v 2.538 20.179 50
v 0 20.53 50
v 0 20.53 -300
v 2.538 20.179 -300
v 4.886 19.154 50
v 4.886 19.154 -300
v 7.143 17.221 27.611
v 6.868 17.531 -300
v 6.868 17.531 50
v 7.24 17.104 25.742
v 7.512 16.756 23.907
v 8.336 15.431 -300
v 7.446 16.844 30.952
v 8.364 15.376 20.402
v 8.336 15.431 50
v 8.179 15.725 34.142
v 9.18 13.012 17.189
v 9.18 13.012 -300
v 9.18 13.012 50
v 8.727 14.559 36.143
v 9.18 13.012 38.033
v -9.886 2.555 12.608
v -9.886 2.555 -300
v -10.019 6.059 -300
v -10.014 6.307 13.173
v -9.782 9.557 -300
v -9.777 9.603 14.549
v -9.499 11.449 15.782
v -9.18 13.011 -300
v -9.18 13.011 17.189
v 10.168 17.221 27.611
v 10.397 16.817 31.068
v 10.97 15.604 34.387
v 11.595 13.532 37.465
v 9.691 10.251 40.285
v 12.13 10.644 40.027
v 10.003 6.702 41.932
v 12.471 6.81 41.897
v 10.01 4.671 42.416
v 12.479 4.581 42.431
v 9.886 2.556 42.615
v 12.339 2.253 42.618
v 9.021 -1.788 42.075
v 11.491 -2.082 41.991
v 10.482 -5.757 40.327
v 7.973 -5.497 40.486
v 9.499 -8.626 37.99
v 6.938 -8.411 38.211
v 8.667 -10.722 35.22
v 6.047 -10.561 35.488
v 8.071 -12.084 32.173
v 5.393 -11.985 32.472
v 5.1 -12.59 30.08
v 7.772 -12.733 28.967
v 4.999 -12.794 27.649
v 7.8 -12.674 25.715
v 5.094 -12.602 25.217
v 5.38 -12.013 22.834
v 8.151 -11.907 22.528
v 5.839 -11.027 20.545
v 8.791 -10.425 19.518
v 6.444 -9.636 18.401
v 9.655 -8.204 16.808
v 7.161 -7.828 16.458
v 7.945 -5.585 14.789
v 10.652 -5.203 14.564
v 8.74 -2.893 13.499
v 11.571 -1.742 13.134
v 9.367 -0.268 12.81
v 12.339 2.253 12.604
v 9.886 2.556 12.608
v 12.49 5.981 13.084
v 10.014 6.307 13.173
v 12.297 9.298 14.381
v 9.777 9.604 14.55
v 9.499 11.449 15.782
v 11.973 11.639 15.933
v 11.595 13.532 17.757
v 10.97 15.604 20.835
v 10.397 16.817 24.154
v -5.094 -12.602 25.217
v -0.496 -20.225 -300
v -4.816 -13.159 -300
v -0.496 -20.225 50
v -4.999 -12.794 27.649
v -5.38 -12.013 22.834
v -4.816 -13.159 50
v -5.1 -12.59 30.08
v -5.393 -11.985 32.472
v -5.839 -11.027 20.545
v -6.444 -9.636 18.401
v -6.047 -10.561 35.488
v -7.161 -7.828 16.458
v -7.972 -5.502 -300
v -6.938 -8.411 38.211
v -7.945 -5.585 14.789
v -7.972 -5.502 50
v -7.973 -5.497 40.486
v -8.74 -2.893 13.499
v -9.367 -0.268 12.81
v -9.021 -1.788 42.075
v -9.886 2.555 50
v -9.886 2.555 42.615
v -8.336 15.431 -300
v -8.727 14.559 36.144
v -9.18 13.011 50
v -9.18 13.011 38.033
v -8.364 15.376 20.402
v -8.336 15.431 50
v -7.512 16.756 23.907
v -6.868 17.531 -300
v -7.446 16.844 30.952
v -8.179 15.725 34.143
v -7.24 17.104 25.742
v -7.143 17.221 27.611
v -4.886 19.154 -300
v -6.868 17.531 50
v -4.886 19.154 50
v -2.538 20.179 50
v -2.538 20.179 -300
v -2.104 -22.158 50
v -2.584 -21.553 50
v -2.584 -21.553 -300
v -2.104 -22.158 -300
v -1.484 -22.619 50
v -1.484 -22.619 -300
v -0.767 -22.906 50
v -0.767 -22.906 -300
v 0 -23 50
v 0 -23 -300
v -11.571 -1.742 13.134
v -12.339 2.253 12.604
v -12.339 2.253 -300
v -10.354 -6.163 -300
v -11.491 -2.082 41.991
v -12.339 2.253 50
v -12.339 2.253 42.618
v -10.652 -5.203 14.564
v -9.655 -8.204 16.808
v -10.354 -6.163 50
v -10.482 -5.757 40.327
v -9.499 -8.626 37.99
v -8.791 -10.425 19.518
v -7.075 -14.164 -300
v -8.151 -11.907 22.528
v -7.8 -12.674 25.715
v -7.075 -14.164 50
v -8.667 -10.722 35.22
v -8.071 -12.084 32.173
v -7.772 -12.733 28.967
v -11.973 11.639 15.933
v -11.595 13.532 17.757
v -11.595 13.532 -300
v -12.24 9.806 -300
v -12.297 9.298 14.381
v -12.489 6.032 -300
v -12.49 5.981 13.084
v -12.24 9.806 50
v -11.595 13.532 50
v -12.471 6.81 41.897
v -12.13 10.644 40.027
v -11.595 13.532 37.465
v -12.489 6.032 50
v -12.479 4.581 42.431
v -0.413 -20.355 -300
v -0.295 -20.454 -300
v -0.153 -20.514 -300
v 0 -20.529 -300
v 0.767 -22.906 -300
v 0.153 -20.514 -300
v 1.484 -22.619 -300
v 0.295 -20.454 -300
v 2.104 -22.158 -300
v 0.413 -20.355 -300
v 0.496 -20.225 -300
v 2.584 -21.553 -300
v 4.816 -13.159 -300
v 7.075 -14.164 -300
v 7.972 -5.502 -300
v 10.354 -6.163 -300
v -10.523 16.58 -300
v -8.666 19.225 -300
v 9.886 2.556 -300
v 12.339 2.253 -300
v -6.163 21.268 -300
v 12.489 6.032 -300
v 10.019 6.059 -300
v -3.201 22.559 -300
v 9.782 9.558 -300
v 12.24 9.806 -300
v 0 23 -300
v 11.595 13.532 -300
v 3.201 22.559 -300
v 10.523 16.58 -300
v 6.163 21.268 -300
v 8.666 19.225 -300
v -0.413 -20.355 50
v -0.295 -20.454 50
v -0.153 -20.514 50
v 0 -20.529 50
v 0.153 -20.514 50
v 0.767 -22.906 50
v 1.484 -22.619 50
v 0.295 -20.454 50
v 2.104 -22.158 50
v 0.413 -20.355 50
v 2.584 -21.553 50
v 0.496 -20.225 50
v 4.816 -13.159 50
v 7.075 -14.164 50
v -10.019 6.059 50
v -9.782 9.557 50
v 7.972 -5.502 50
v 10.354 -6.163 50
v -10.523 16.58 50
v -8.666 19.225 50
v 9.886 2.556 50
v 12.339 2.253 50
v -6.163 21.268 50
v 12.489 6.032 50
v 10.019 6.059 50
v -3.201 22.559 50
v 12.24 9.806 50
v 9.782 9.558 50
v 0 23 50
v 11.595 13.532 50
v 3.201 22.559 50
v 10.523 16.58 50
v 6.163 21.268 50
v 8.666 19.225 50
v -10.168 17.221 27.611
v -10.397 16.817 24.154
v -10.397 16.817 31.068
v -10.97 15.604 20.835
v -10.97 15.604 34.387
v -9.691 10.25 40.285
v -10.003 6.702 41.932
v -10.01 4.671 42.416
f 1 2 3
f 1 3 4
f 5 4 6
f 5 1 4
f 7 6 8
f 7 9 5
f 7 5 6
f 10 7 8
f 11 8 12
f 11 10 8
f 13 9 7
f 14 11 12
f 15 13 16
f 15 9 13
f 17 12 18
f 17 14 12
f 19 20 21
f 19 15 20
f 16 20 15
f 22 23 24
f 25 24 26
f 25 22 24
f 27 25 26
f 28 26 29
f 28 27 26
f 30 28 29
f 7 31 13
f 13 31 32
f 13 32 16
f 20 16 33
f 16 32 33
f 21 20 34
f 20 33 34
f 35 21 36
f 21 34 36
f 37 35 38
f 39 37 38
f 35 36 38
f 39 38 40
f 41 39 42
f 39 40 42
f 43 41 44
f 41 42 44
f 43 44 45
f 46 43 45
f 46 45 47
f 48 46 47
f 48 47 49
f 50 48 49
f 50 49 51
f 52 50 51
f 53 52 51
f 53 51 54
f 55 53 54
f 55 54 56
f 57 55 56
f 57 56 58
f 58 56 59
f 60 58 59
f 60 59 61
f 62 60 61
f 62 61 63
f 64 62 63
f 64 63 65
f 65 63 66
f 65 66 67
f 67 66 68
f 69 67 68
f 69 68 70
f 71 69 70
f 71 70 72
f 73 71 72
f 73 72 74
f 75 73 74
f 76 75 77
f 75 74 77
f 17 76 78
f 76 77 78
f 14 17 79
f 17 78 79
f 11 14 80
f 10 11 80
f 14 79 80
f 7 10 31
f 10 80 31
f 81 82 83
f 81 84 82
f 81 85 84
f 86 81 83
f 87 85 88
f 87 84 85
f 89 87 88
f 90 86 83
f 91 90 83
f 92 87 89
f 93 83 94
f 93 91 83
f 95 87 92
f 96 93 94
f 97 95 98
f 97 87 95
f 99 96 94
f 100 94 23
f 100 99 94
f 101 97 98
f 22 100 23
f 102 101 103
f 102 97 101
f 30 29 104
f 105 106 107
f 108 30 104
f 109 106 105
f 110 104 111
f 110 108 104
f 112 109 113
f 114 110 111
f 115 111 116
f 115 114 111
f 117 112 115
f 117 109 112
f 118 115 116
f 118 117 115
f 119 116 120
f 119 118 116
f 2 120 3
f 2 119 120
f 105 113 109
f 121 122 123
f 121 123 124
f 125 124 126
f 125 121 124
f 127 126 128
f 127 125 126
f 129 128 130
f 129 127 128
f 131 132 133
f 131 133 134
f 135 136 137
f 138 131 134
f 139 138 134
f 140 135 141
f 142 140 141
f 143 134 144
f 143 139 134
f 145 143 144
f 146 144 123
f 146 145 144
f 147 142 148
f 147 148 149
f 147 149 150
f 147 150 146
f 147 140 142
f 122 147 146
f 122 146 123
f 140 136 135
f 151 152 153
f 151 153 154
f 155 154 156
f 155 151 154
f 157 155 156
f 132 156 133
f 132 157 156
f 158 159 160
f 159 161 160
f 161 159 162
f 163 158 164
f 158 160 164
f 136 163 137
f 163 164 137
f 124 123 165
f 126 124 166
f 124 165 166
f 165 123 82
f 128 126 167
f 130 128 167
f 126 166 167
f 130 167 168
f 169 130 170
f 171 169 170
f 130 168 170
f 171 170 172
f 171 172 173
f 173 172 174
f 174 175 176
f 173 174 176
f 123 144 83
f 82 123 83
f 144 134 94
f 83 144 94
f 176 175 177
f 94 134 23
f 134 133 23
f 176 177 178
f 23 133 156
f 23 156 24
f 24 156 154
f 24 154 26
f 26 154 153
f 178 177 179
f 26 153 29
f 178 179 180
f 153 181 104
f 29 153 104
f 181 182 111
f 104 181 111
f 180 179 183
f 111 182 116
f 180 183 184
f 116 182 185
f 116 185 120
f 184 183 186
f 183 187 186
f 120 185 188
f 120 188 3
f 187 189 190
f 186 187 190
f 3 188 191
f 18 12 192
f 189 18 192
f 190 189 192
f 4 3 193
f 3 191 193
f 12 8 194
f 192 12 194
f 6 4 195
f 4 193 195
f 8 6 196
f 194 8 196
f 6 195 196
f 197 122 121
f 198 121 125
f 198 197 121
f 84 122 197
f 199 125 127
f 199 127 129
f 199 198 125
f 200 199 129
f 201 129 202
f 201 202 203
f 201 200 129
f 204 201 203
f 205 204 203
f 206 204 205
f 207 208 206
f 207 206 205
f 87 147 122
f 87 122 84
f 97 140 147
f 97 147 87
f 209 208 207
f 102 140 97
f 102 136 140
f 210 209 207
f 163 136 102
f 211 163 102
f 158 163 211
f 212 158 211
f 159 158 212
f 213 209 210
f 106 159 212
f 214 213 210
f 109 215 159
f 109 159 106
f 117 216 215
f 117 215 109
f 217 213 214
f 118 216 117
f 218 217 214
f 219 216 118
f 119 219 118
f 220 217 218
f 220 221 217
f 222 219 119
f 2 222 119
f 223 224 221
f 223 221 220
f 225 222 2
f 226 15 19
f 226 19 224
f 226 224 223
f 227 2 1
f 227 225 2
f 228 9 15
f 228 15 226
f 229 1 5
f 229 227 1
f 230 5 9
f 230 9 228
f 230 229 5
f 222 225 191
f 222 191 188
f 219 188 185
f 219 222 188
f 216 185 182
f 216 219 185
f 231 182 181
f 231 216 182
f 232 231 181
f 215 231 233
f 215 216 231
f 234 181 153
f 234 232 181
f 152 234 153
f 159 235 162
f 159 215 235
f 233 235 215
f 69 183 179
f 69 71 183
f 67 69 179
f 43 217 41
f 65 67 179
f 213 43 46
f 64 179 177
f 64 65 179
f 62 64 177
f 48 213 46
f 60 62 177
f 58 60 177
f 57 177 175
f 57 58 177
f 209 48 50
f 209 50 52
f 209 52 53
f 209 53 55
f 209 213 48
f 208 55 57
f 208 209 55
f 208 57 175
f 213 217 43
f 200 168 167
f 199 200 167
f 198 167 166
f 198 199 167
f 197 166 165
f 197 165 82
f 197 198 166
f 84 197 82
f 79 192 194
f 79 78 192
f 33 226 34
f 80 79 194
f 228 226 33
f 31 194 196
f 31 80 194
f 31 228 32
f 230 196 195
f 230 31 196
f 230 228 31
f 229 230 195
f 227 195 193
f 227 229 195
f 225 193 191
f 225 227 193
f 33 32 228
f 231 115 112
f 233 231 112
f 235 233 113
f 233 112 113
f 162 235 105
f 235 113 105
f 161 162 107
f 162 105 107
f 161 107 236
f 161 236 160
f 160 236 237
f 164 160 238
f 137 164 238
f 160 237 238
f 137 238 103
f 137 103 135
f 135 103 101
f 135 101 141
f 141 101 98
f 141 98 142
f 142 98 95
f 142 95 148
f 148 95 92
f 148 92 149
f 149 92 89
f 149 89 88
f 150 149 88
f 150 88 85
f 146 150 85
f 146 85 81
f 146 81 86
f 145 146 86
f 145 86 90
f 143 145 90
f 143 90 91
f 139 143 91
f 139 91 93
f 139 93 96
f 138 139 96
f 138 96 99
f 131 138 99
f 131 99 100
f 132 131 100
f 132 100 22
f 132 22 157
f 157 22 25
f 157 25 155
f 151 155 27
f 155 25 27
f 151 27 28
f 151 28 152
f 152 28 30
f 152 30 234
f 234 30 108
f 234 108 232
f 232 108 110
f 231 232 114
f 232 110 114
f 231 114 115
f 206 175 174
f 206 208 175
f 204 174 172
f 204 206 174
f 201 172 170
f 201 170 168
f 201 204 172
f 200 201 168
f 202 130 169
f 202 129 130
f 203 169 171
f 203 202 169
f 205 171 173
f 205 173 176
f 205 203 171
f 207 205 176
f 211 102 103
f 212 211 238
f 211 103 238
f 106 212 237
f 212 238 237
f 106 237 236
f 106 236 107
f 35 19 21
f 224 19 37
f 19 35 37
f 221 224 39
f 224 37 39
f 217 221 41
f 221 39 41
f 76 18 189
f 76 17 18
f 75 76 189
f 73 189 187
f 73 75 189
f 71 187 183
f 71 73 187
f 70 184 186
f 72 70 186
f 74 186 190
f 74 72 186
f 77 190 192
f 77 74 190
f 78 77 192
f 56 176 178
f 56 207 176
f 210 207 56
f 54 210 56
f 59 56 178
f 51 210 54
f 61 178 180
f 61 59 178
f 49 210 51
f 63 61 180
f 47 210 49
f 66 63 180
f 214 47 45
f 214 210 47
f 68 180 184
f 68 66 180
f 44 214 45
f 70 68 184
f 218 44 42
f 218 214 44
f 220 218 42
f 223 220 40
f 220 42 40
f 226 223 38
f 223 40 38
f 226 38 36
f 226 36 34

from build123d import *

# Parameters (mm, degrees)
F1_DEPTH = 50
F2_R     = 15.0073664172
F3_DEPTH = 25
F4_DEPTH = 300


# Not quite as in the source:
# - ends of sketch curves that miss each other by under 0.0002 mm in the source are joined


with BuildPart() as f1:
    # F0 (on Top) → F1 (new body)
    with BuildSketch(Plane.XY):
        with BuildLine():
            ThreePointArc((11.5946267397, 13.5320293348), (7.4846115717, 20.3323038327), (0, 22.9999896369))
            ThreePointArc((0, 22.9999896369), (-7.4846118013, 20.3323037509), (-11.5946270955, 13.5320290443))
            ThreePointArc((-11.5946270955, 13.5320290443), (-12.4147063987, 7.922168163), (-12.3388696742, 2.2531896672))
            ThreePointArc((-12.3388696742, 2.2531896672), (-8.8719983331, -10.2277960598), (-2.5843411657, -21.5529706895))
            ThreePointArc((-2.5843411657, -21.5529706895), (-1.4841666884, -22.619355112), (7e-08, -22.9998983316))
            ThreePointArc((7e-08, -22.9998983316), (1.4841670374, -22.6193504592), (2.5843454149, -21.5529672416))
            ThreePointArc((2.5843454149, -21.5529672416), (8.872000694, -10.2277939953), (12.3388707315, 2.2531898872))
            ThreePointArc((12.3388707315, 2.2531898872), (12.4147117976, 7.9221688824), (11.5946267397, 13.5320293348))
        make_face()
        with BuildLine():
            ThreePointArc((0, 20.5299898954), (5.9328912698, 18.410508519), (9.1798866708, 13.011580756))
            ThreePointArc((9.1798866708, 13.011580756), (9.9466025789, 7.8114966866), (9.8862458377, 2.5555396209))
            ThreePointArc((9.8862458377, 2.5555396209), (6.5447373666, -9.3927265107), (0.4963170659, -20.2252402669))
            ThreePointArc((0.4963170659, -20.2252402669), (0.2950851675, -20.4538524641), (4.0013e-05, -20.529391662))
            ThreePointArc((4.0013e-05, -20.529391662), (-0.2950640986, -20.4538699373), (-0.4963311707, -20.2252183832))
            ThreePointArc((-0.4963311707, -20.2252183832), (-6.5447290925, -9.3927429052), (-9.8862348466, 2.5554779538))
            ThreePointArc((-9.8862348466, 2.5554779538), (-9.9466064803, 7.8113582927), (-9.1799291893, 13.0113706774))
            ThreePointArc((-9.1799291893, 13.0113706774), (-5.9329742724, 18.4104406446), (0, 20.5299898954))
        make_face(mode=Mode.SUBTRACT)
    extrude(amount=F1_DEPTH)

    # F2 (on Right) → F3 (cut, symmetric)
    with BuildSketch(Plane.YZ):
        with Locations((2.2132990416, 27.6111345738)):
            Circle(F2_R)
    extrude(amount=F3_DEPTH, both=True, mode=Mode.SUBTRACT)

    # F4 (add): a face of the model
    f4_faces = [f1.faces().sort_by_distance(p)[0] for p in [
        (7.153517518, 19.9268403702, 0),
    ]]
    extrude(f4_faces, amount=F4_DEPTH)


solid = f1.part
